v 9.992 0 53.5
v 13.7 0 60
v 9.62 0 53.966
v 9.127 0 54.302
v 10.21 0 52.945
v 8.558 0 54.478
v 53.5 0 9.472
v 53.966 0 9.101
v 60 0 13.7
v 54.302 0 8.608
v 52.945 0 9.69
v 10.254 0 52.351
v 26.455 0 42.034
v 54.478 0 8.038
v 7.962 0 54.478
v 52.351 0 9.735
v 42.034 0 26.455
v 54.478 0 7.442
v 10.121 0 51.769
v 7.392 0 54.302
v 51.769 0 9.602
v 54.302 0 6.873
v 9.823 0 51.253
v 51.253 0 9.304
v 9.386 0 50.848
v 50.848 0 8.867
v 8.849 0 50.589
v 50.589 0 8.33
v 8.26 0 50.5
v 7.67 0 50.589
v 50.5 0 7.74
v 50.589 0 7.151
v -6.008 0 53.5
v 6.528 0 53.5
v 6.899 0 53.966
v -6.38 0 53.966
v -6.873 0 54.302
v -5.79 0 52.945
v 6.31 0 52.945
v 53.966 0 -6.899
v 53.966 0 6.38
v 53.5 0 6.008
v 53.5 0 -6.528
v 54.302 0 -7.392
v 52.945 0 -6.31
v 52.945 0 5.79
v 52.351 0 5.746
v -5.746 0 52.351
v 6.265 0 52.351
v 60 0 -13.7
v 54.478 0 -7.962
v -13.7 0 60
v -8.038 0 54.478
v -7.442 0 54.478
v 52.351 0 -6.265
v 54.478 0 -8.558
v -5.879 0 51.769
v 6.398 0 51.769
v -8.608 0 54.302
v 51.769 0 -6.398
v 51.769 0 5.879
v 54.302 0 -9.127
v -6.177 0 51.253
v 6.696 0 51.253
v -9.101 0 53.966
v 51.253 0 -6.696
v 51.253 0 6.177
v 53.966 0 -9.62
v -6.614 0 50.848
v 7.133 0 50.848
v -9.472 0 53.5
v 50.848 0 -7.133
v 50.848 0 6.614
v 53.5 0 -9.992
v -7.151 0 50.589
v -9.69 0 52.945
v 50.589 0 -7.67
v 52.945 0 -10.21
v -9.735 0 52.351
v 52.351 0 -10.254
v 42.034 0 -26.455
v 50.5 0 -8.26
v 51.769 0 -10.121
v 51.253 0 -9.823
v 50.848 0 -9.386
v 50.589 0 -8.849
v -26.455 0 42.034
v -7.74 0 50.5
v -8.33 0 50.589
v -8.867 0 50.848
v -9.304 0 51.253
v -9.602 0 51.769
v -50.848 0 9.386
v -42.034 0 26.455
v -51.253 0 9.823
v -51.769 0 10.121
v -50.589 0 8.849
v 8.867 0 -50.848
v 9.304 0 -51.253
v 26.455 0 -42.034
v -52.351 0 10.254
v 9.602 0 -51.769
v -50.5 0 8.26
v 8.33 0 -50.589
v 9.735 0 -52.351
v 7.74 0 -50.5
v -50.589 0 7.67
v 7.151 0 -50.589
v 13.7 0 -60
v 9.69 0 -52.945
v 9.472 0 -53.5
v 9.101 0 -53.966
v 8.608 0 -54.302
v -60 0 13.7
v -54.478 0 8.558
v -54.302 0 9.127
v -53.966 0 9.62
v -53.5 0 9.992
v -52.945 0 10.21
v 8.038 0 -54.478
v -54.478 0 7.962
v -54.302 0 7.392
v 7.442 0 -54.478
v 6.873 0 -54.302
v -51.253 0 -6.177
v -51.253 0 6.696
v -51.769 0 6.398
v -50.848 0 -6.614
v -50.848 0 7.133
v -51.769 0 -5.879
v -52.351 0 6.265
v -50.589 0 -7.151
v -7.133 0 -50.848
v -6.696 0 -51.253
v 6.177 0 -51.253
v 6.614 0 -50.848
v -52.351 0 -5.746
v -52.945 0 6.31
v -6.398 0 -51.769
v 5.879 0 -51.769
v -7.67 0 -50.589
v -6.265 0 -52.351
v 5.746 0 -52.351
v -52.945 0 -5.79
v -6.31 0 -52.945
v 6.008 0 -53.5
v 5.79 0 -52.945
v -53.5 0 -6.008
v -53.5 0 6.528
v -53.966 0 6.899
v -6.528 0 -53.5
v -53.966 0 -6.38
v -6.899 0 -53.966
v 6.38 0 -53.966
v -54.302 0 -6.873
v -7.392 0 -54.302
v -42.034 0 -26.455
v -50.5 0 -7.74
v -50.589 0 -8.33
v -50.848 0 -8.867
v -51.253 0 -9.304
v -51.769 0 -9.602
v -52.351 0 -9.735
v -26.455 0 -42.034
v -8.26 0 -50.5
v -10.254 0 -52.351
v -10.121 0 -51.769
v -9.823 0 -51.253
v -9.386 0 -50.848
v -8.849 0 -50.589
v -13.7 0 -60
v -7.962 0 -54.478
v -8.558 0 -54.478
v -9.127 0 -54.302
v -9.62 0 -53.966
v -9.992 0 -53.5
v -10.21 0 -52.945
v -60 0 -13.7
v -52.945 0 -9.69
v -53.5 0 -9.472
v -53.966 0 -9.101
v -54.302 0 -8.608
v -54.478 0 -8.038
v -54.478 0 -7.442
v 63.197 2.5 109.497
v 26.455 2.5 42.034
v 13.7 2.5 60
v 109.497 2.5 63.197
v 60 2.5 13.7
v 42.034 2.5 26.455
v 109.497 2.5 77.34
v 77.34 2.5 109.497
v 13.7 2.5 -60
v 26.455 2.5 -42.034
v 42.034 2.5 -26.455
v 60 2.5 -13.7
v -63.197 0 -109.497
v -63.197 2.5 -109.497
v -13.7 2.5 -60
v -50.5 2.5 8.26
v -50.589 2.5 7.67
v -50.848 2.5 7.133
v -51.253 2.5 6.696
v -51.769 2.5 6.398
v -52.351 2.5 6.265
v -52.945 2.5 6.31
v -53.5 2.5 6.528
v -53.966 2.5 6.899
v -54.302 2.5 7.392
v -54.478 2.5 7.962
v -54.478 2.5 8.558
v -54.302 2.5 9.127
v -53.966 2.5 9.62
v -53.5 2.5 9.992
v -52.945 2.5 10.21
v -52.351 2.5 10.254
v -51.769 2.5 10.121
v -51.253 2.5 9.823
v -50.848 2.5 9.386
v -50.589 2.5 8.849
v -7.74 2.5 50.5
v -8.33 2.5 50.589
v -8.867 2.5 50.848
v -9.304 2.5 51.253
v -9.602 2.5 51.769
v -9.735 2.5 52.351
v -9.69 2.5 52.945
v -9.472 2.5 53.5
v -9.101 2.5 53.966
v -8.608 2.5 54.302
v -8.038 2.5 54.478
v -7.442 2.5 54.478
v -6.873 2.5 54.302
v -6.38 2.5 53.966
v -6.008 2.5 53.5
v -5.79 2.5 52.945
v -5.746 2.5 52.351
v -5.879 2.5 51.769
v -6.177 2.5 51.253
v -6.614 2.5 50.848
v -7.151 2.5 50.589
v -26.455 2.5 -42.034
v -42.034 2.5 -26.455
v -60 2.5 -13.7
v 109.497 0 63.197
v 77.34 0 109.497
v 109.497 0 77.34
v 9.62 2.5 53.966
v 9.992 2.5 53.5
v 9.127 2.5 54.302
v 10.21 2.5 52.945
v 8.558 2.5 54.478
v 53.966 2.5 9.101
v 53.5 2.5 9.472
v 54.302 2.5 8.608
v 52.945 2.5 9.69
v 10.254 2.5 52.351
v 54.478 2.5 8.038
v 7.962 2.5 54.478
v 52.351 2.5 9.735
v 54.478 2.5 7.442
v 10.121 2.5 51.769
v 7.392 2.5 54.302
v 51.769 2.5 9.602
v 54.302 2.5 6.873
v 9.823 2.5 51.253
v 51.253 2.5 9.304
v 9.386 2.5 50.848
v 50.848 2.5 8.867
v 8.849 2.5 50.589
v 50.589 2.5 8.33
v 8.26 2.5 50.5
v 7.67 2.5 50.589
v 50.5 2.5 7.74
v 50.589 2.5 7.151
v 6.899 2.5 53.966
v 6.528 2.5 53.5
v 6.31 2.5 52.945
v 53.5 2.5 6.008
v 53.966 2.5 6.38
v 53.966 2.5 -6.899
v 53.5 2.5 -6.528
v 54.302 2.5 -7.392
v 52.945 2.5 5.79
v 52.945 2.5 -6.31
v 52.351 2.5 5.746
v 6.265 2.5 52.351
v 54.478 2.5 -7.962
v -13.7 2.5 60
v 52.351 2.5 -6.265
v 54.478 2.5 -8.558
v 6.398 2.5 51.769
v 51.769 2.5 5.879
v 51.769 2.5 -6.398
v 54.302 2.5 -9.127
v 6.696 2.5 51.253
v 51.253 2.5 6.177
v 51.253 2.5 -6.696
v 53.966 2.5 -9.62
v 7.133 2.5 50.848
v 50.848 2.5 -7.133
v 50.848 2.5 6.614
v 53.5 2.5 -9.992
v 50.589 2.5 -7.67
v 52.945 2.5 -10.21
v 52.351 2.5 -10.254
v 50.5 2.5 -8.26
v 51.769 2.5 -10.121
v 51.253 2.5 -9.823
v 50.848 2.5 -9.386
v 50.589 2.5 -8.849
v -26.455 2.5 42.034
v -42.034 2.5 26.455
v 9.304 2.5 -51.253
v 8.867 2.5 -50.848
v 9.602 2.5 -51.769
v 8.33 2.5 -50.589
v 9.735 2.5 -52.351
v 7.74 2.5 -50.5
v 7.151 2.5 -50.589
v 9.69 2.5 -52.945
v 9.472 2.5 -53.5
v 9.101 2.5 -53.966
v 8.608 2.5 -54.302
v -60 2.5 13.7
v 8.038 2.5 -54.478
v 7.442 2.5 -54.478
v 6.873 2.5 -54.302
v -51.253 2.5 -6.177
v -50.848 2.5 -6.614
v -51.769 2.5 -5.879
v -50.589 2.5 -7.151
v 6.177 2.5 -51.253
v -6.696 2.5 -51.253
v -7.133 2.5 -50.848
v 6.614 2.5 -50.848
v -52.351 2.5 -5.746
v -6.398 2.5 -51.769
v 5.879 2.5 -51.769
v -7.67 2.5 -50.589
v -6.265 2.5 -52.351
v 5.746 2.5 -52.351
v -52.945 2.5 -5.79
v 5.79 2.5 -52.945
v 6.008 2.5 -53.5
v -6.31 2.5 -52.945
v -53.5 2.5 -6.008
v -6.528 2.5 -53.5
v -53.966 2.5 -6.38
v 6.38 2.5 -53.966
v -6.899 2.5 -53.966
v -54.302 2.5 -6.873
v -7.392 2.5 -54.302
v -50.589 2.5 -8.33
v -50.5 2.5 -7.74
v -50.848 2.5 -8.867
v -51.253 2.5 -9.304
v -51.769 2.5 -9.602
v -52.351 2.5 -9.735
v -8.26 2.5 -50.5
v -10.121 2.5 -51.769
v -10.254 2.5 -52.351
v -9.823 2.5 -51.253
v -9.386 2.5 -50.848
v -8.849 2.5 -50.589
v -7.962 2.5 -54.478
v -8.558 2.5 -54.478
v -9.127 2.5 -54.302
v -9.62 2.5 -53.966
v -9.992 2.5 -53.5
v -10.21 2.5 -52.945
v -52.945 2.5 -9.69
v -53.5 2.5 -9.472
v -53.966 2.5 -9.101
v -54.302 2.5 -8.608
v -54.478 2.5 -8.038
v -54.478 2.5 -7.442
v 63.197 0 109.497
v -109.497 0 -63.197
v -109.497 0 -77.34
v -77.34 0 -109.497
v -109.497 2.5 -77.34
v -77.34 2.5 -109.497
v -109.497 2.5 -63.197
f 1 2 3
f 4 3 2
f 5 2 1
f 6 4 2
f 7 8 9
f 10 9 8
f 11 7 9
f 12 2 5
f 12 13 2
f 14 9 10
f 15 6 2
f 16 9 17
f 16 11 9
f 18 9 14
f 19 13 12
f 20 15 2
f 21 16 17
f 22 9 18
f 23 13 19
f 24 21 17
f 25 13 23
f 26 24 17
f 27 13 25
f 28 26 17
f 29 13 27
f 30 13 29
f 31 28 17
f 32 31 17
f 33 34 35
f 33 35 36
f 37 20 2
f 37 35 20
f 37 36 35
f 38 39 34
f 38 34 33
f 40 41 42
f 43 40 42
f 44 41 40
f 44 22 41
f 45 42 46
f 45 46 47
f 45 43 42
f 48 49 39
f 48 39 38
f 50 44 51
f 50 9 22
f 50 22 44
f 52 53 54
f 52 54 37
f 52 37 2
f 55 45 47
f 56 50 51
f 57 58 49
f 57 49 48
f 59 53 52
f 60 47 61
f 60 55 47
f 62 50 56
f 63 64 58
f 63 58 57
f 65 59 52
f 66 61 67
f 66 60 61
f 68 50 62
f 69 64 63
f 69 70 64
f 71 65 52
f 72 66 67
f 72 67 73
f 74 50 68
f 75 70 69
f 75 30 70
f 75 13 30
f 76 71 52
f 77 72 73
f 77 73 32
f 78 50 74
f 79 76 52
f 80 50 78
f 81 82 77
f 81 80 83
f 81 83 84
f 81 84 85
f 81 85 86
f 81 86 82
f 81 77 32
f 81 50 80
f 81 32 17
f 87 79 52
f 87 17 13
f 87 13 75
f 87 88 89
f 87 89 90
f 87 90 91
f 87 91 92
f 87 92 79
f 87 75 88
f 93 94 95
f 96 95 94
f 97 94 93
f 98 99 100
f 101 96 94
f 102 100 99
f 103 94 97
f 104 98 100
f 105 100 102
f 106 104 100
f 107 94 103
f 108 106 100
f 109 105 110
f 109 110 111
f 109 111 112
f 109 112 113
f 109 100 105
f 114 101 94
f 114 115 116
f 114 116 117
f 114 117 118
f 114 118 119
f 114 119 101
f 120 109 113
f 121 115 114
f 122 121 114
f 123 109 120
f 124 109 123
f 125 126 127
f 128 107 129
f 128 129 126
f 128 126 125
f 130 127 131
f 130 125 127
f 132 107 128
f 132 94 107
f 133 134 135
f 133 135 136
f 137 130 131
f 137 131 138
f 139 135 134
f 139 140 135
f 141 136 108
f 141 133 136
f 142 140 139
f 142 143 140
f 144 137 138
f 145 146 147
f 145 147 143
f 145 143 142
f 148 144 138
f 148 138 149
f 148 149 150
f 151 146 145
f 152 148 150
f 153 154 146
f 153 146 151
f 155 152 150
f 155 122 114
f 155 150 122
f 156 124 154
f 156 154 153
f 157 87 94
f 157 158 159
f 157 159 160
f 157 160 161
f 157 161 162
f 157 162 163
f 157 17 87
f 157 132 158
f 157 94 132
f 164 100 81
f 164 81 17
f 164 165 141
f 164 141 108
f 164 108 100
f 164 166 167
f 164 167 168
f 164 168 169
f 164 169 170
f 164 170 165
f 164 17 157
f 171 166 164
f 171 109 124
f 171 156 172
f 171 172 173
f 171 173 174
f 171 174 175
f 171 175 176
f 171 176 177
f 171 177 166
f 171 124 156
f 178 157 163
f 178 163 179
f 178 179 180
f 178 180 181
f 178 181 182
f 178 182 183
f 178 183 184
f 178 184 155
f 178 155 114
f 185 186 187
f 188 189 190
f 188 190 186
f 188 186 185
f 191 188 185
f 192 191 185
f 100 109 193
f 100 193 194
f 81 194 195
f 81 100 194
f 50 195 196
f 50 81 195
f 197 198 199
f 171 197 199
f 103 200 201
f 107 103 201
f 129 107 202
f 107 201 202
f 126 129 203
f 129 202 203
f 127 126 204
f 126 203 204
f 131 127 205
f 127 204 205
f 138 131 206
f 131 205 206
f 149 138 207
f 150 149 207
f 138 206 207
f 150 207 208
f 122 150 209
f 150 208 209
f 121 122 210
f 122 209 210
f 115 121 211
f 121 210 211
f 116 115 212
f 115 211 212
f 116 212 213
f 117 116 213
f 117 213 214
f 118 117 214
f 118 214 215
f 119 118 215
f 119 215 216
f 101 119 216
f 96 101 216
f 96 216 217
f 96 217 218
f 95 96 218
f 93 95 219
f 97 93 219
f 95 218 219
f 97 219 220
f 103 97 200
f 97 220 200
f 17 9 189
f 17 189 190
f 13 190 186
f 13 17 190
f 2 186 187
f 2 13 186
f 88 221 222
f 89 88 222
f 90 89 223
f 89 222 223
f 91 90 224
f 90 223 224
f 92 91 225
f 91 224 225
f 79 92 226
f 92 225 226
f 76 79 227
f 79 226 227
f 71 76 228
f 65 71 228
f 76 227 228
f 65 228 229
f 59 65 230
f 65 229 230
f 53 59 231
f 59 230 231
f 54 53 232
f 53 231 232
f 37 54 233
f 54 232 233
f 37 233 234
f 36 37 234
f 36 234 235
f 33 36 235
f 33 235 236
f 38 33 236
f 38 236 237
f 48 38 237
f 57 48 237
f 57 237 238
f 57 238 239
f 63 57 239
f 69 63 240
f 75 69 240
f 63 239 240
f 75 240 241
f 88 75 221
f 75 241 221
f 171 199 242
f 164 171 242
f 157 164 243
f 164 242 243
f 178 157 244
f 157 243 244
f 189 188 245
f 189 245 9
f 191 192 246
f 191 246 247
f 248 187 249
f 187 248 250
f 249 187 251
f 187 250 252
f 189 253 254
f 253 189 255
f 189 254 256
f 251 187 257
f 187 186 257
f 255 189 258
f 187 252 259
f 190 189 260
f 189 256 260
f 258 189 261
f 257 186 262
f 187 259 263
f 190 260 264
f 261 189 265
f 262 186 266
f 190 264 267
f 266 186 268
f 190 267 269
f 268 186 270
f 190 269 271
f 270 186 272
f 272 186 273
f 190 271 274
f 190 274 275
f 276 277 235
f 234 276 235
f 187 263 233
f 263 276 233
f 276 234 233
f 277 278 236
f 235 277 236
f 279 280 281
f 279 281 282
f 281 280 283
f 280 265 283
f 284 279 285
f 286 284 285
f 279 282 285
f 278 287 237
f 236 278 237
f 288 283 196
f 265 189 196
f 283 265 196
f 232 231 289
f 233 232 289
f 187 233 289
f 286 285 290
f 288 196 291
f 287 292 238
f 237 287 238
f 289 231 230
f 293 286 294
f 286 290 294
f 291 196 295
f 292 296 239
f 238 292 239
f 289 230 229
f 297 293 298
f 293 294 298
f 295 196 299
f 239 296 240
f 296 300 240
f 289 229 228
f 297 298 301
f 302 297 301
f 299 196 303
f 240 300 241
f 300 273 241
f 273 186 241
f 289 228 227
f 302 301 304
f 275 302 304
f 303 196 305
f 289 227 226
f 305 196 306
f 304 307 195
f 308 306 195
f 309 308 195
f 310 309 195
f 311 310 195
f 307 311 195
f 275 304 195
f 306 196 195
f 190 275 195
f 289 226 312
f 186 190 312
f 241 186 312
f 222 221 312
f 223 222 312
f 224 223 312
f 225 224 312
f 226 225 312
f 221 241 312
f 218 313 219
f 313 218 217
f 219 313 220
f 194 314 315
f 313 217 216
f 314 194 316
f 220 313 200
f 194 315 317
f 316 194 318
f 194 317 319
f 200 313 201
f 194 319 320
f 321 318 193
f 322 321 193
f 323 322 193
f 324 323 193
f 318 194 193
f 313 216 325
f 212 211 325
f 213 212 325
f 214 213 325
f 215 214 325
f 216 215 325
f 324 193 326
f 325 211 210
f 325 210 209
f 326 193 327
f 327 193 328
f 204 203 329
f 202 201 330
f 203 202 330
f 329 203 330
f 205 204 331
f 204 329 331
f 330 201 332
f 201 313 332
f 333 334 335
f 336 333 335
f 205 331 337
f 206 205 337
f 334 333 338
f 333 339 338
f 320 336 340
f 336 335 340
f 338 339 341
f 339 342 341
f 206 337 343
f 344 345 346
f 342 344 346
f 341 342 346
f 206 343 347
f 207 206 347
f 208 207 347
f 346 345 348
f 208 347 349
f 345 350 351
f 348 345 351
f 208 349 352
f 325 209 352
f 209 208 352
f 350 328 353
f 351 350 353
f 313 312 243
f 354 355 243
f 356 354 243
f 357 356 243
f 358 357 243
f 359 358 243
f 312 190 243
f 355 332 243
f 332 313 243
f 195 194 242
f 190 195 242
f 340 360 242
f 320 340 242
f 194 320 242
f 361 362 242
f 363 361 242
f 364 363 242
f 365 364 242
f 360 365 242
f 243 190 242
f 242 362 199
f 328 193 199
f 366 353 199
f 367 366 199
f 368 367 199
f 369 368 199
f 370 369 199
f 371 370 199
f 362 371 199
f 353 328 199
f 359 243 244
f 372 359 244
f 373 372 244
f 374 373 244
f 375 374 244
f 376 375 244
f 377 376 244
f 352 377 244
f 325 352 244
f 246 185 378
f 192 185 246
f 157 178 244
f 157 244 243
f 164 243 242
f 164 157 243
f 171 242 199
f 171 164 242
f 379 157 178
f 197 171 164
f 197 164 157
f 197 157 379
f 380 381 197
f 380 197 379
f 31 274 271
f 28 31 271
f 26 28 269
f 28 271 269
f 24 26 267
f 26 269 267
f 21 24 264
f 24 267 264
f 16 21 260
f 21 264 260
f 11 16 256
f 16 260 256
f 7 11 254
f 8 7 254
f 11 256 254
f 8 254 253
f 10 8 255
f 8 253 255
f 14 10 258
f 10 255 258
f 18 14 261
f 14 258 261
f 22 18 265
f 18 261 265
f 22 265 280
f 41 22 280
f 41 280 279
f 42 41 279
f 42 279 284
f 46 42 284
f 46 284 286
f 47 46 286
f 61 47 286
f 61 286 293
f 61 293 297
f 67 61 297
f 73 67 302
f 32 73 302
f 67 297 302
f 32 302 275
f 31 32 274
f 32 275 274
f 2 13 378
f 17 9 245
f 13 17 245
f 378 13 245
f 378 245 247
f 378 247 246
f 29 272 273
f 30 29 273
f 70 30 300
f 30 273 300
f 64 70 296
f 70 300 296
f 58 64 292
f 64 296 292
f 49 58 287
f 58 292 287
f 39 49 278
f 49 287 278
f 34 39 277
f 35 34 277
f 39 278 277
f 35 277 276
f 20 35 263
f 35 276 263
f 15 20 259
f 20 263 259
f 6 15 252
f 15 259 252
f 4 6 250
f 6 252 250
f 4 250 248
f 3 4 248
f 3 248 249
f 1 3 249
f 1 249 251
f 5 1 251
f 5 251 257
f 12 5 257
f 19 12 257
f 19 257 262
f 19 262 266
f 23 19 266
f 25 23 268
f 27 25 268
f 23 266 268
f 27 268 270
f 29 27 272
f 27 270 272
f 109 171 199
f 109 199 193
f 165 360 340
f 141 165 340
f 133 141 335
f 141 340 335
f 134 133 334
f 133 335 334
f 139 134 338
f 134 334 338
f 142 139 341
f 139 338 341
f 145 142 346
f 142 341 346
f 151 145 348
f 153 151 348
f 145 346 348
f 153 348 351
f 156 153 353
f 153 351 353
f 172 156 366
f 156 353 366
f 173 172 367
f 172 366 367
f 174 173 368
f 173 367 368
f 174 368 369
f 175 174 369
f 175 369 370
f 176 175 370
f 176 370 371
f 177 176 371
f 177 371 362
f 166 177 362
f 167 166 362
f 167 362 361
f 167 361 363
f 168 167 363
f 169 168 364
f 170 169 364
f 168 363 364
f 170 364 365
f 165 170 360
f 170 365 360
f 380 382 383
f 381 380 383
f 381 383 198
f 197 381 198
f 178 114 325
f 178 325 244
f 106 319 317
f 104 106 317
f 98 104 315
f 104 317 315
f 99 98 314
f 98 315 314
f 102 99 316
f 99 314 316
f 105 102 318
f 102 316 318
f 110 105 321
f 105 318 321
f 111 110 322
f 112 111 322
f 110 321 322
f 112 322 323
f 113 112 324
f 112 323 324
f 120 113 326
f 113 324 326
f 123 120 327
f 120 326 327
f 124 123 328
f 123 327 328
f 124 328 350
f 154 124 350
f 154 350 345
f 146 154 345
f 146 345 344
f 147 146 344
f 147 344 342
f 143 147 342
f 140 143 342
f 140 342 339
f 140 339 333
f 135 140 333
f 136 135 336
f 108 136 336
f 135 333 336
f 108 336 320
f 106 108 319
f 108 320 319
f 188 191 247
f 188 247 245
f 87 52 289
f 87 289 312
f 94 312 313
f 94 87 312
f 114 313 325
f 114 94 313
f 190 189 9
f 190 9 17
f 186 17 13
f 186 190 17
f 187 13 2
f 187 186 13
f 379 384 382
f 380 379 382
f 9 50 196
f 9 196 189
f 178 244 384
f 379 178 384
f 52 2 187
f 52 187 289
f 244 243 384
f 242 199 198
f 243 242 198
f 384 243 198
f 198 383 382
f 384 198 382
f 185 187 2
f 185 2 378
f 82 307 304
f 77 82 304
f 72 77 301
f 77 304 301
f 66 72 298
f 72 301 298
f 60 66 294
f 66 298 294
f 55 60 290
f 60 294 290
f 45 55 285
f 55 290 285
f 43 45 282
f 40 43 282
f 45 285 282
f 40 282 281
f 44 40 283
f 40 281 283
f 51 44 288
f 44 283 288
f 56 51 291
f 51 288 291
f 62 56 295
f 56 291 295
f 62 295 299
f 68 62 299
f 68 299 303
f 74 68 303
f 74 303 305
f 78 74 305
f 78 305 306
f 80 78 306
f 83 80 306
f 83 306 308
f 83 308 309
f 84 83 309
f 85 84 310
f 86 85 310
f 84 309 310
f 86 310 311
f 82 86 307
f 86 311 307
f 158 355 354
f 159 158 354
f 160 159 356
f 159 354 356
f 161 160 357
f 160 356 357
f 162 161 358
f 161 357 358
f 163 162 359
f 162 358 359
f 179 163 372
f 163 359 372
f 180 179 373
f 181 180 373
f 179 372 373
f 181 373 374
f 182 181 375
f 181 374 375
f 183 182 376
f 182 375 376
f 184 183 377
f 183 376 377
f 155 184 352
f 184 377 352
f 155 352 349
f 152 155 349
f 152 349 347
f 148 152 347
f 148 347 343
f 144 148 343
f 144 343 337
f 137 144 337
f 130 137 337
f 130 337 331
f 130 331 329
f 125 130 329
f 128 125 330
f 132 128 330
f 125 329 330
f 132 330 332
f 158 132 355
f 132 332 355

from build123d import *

# Parameters (mm, degrees)
BOSS_EXTRUDE1_DEPTH = 2.5
SKETCH3_R           = 2
CUT_EXTRUDE1_DEPTH  = 2.5
CIRPATTERN1_COUNT   = 4
BOSS_EXTRUDE2_DEPTH = 2.5


with BuildPart() as part:
    # Sketch1 → Boss-Extrude1 (new body)
    with BuildSketch(Plane(origin=(0, 0, 0), x_dir=(1, 0, 0), z_dir=(0, 1, 0))):
        with BuildLine():
            Line((-13.7, 60), (13.7, 60))
            ThreePointArc((13.7, 60), (33.917107936, 33.917107936), (60, 13.7))
            Line((60, 13.7), (60, -13.7))
            ThreePointArc((60, -13.7), (33.917107936, -33.917107936), (13.7, -60))
            Line((13.7, -60), (-13.7, -60))
            ThreePointArc((-13.7, -60), (-33.917107936, -33.917107936), (-60, -13.7))
            Line((-60, -13.7), (-60, 13.7))
            ThreePointArc((-60, 13.7), (-33.917107936, 33.917107936), (-13.7, 60))
        make_face()
    extrude(amount=BOSS_EXTRUDE1_DEPTH)

    # Sketch3 → Cut-Extrude1 (cut)
    with BuildSketch(Plane(origin=(0, 2.5, 0), x_dir=(1, 0, 0), z_dir=(0, 1, 0))):
        with Locations((-8.259716624, 52.5)):
            Circle(SKETCH3_R)
        with Locations((7.740283376, 52.5)):
            Circle(SKETCH3_R)
    cut_extrude1 = extrude(amount=-CUT_EXTRUDE1_DEPTH, mode=Mode.SUBTRACT)

    # CirPattern1: Cut-Extrude1 ×4 about axis
    cirpattern1_axis = Axis((0, 0, 0), (0, 1, 0))
    for i in range(1, CIRPATTERN1_COUNT):
        add(cut_extrude1.rotate(cirpattern1_axis, i * 360 / CIRPATTERN1_COUNT), mode=Mode.SUBTRACT)


with BuildPart() as body_2:
    # Sketch4 → Boss-Extrude2 (new body)
    with BuildSketch(Plane(origin=(0, 2.5, 0), x_dir=(1, 0, 0), z_dir=(0, 1, 0))):
        with BuildLine():
            Line((-60, 13.7), (-109.497474683, 63.197474683))
            Line((-109.497474683, 63.197474683), (-109.497474683, 77.339610307))
            Line((-109.497474683, 77.339610307), (-77.339610307, 109.497474683))
            Line((-77.339610307, 109.497474683), (-63.197474683, 109.497474683))
            Line((-63.197474683, 109.497474683), (-13.7, 60))
            ThreePointArc((-13.7, 60), (-33.917107936, 33.917107936), (-60, 13.7))
        make_face()
    extrude(amount=-BOSS_EXTRUDE2_DEPTH)


with BuildPart() as body_3:
    # Mirror3: mirrored copy
    add(body_2.part.mirror(Plane(origin=(0, 0, 0), x_dir=(-0.7071067811865492, 0, 0.7071067811865459), z_dir=(-0.707106781186546, 0, -0.7071067811865491))))


solid = Compound([part.part, body_2.part, body_3.part])
